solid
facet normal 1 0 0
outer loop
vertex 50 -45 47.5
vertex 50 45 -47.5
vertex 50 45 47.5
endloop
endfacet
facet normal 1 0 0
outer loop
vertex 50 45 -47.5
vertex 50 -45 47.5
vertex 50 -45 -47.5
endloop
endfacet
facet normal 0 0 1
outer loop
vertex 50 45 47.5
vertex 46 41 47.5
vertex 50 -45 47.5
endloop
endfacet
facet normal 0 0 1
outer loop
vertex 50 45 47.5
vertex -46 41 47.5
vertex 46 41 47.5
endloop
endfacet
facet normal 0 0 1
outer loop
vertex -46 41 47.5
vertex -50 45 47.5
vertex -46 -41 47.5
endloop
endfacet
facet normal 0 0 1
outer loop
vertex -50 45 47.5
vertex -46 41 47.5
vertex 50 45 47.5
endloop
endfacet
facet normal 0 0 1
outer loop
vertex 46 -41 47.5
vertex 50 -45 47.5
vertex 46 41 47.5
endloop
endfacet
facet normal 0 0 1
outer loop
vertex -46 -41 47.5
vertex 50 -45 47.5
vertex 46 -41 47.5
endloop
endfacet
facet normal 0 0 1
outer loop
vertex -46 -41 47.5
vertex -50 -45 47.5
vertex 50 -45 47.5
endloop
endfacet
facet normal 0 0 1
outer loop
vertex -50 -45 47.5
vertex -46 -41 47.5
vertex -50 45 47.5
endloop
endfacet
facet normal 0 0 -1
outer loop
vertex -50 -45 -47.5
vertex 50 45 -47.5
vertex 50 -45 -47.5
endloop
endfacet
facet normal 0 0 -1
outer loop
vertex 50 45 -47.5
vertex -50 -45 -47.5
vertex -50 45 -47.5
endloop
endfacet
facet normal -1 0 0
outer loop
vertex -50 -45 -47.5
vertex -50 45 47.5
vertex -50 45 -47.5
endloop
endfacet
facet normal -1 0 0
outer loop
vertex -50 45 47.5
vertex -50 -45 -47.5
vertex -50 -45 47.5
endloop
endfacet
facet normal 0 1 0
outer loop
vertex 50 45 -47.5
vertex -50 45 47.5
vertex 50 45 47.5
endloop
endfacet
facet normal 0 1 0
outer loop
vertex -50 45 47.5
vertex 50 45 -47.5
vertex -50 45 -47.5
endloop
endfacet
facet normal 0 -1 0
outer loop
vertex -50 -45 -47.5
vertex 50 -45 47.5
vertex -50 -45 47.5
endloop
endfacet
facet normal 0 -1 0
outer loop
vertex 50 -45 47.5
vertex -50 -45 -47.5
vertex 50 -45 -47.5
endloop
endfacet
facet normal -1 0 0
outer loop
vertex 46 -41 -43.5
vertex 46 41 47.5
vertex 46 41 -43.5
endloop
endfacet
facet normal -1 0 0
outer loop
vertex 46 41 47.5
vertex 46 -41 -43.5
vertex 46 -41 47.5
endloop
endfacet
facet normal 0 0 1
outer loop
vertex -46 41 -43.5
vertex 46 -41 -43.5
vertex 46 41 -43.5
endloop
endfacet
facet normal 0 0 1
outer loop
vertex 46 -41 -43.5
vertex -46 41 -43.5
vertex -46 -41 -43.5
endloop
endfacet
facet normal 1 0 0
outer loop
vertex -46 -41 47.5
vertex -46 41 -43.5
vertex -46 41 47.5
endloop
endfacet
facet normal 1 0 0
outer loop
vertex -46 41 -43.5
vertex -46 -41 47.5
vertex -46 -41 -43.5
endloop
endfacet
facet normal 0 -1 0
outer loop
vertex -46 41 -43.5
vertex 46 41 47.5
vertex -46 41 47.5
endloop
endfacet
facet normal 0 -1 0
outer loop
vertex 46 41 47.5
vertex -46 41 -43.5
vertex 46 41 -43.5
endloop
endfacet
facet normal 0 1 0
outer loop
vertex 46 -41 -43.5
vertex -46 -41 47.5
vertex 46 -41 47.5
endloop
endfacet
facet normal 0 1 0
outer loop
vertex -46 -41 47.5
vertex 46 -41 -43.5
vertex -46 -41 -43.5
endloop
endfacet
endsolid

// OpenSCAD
// ========================================
// a 100 x 90 x 95 mm enclosure with 4 mm wall thickness
// NeuroCAD canonical IR; dimensions are millimetres
// ========================================
$fn = 48;

difference() {
  cube(size=[100, 90, 95], center=true);
  translate([0, 0, 2.1]) {
    cube(size=[92, 82, 91.2], center=true);
  }
}
